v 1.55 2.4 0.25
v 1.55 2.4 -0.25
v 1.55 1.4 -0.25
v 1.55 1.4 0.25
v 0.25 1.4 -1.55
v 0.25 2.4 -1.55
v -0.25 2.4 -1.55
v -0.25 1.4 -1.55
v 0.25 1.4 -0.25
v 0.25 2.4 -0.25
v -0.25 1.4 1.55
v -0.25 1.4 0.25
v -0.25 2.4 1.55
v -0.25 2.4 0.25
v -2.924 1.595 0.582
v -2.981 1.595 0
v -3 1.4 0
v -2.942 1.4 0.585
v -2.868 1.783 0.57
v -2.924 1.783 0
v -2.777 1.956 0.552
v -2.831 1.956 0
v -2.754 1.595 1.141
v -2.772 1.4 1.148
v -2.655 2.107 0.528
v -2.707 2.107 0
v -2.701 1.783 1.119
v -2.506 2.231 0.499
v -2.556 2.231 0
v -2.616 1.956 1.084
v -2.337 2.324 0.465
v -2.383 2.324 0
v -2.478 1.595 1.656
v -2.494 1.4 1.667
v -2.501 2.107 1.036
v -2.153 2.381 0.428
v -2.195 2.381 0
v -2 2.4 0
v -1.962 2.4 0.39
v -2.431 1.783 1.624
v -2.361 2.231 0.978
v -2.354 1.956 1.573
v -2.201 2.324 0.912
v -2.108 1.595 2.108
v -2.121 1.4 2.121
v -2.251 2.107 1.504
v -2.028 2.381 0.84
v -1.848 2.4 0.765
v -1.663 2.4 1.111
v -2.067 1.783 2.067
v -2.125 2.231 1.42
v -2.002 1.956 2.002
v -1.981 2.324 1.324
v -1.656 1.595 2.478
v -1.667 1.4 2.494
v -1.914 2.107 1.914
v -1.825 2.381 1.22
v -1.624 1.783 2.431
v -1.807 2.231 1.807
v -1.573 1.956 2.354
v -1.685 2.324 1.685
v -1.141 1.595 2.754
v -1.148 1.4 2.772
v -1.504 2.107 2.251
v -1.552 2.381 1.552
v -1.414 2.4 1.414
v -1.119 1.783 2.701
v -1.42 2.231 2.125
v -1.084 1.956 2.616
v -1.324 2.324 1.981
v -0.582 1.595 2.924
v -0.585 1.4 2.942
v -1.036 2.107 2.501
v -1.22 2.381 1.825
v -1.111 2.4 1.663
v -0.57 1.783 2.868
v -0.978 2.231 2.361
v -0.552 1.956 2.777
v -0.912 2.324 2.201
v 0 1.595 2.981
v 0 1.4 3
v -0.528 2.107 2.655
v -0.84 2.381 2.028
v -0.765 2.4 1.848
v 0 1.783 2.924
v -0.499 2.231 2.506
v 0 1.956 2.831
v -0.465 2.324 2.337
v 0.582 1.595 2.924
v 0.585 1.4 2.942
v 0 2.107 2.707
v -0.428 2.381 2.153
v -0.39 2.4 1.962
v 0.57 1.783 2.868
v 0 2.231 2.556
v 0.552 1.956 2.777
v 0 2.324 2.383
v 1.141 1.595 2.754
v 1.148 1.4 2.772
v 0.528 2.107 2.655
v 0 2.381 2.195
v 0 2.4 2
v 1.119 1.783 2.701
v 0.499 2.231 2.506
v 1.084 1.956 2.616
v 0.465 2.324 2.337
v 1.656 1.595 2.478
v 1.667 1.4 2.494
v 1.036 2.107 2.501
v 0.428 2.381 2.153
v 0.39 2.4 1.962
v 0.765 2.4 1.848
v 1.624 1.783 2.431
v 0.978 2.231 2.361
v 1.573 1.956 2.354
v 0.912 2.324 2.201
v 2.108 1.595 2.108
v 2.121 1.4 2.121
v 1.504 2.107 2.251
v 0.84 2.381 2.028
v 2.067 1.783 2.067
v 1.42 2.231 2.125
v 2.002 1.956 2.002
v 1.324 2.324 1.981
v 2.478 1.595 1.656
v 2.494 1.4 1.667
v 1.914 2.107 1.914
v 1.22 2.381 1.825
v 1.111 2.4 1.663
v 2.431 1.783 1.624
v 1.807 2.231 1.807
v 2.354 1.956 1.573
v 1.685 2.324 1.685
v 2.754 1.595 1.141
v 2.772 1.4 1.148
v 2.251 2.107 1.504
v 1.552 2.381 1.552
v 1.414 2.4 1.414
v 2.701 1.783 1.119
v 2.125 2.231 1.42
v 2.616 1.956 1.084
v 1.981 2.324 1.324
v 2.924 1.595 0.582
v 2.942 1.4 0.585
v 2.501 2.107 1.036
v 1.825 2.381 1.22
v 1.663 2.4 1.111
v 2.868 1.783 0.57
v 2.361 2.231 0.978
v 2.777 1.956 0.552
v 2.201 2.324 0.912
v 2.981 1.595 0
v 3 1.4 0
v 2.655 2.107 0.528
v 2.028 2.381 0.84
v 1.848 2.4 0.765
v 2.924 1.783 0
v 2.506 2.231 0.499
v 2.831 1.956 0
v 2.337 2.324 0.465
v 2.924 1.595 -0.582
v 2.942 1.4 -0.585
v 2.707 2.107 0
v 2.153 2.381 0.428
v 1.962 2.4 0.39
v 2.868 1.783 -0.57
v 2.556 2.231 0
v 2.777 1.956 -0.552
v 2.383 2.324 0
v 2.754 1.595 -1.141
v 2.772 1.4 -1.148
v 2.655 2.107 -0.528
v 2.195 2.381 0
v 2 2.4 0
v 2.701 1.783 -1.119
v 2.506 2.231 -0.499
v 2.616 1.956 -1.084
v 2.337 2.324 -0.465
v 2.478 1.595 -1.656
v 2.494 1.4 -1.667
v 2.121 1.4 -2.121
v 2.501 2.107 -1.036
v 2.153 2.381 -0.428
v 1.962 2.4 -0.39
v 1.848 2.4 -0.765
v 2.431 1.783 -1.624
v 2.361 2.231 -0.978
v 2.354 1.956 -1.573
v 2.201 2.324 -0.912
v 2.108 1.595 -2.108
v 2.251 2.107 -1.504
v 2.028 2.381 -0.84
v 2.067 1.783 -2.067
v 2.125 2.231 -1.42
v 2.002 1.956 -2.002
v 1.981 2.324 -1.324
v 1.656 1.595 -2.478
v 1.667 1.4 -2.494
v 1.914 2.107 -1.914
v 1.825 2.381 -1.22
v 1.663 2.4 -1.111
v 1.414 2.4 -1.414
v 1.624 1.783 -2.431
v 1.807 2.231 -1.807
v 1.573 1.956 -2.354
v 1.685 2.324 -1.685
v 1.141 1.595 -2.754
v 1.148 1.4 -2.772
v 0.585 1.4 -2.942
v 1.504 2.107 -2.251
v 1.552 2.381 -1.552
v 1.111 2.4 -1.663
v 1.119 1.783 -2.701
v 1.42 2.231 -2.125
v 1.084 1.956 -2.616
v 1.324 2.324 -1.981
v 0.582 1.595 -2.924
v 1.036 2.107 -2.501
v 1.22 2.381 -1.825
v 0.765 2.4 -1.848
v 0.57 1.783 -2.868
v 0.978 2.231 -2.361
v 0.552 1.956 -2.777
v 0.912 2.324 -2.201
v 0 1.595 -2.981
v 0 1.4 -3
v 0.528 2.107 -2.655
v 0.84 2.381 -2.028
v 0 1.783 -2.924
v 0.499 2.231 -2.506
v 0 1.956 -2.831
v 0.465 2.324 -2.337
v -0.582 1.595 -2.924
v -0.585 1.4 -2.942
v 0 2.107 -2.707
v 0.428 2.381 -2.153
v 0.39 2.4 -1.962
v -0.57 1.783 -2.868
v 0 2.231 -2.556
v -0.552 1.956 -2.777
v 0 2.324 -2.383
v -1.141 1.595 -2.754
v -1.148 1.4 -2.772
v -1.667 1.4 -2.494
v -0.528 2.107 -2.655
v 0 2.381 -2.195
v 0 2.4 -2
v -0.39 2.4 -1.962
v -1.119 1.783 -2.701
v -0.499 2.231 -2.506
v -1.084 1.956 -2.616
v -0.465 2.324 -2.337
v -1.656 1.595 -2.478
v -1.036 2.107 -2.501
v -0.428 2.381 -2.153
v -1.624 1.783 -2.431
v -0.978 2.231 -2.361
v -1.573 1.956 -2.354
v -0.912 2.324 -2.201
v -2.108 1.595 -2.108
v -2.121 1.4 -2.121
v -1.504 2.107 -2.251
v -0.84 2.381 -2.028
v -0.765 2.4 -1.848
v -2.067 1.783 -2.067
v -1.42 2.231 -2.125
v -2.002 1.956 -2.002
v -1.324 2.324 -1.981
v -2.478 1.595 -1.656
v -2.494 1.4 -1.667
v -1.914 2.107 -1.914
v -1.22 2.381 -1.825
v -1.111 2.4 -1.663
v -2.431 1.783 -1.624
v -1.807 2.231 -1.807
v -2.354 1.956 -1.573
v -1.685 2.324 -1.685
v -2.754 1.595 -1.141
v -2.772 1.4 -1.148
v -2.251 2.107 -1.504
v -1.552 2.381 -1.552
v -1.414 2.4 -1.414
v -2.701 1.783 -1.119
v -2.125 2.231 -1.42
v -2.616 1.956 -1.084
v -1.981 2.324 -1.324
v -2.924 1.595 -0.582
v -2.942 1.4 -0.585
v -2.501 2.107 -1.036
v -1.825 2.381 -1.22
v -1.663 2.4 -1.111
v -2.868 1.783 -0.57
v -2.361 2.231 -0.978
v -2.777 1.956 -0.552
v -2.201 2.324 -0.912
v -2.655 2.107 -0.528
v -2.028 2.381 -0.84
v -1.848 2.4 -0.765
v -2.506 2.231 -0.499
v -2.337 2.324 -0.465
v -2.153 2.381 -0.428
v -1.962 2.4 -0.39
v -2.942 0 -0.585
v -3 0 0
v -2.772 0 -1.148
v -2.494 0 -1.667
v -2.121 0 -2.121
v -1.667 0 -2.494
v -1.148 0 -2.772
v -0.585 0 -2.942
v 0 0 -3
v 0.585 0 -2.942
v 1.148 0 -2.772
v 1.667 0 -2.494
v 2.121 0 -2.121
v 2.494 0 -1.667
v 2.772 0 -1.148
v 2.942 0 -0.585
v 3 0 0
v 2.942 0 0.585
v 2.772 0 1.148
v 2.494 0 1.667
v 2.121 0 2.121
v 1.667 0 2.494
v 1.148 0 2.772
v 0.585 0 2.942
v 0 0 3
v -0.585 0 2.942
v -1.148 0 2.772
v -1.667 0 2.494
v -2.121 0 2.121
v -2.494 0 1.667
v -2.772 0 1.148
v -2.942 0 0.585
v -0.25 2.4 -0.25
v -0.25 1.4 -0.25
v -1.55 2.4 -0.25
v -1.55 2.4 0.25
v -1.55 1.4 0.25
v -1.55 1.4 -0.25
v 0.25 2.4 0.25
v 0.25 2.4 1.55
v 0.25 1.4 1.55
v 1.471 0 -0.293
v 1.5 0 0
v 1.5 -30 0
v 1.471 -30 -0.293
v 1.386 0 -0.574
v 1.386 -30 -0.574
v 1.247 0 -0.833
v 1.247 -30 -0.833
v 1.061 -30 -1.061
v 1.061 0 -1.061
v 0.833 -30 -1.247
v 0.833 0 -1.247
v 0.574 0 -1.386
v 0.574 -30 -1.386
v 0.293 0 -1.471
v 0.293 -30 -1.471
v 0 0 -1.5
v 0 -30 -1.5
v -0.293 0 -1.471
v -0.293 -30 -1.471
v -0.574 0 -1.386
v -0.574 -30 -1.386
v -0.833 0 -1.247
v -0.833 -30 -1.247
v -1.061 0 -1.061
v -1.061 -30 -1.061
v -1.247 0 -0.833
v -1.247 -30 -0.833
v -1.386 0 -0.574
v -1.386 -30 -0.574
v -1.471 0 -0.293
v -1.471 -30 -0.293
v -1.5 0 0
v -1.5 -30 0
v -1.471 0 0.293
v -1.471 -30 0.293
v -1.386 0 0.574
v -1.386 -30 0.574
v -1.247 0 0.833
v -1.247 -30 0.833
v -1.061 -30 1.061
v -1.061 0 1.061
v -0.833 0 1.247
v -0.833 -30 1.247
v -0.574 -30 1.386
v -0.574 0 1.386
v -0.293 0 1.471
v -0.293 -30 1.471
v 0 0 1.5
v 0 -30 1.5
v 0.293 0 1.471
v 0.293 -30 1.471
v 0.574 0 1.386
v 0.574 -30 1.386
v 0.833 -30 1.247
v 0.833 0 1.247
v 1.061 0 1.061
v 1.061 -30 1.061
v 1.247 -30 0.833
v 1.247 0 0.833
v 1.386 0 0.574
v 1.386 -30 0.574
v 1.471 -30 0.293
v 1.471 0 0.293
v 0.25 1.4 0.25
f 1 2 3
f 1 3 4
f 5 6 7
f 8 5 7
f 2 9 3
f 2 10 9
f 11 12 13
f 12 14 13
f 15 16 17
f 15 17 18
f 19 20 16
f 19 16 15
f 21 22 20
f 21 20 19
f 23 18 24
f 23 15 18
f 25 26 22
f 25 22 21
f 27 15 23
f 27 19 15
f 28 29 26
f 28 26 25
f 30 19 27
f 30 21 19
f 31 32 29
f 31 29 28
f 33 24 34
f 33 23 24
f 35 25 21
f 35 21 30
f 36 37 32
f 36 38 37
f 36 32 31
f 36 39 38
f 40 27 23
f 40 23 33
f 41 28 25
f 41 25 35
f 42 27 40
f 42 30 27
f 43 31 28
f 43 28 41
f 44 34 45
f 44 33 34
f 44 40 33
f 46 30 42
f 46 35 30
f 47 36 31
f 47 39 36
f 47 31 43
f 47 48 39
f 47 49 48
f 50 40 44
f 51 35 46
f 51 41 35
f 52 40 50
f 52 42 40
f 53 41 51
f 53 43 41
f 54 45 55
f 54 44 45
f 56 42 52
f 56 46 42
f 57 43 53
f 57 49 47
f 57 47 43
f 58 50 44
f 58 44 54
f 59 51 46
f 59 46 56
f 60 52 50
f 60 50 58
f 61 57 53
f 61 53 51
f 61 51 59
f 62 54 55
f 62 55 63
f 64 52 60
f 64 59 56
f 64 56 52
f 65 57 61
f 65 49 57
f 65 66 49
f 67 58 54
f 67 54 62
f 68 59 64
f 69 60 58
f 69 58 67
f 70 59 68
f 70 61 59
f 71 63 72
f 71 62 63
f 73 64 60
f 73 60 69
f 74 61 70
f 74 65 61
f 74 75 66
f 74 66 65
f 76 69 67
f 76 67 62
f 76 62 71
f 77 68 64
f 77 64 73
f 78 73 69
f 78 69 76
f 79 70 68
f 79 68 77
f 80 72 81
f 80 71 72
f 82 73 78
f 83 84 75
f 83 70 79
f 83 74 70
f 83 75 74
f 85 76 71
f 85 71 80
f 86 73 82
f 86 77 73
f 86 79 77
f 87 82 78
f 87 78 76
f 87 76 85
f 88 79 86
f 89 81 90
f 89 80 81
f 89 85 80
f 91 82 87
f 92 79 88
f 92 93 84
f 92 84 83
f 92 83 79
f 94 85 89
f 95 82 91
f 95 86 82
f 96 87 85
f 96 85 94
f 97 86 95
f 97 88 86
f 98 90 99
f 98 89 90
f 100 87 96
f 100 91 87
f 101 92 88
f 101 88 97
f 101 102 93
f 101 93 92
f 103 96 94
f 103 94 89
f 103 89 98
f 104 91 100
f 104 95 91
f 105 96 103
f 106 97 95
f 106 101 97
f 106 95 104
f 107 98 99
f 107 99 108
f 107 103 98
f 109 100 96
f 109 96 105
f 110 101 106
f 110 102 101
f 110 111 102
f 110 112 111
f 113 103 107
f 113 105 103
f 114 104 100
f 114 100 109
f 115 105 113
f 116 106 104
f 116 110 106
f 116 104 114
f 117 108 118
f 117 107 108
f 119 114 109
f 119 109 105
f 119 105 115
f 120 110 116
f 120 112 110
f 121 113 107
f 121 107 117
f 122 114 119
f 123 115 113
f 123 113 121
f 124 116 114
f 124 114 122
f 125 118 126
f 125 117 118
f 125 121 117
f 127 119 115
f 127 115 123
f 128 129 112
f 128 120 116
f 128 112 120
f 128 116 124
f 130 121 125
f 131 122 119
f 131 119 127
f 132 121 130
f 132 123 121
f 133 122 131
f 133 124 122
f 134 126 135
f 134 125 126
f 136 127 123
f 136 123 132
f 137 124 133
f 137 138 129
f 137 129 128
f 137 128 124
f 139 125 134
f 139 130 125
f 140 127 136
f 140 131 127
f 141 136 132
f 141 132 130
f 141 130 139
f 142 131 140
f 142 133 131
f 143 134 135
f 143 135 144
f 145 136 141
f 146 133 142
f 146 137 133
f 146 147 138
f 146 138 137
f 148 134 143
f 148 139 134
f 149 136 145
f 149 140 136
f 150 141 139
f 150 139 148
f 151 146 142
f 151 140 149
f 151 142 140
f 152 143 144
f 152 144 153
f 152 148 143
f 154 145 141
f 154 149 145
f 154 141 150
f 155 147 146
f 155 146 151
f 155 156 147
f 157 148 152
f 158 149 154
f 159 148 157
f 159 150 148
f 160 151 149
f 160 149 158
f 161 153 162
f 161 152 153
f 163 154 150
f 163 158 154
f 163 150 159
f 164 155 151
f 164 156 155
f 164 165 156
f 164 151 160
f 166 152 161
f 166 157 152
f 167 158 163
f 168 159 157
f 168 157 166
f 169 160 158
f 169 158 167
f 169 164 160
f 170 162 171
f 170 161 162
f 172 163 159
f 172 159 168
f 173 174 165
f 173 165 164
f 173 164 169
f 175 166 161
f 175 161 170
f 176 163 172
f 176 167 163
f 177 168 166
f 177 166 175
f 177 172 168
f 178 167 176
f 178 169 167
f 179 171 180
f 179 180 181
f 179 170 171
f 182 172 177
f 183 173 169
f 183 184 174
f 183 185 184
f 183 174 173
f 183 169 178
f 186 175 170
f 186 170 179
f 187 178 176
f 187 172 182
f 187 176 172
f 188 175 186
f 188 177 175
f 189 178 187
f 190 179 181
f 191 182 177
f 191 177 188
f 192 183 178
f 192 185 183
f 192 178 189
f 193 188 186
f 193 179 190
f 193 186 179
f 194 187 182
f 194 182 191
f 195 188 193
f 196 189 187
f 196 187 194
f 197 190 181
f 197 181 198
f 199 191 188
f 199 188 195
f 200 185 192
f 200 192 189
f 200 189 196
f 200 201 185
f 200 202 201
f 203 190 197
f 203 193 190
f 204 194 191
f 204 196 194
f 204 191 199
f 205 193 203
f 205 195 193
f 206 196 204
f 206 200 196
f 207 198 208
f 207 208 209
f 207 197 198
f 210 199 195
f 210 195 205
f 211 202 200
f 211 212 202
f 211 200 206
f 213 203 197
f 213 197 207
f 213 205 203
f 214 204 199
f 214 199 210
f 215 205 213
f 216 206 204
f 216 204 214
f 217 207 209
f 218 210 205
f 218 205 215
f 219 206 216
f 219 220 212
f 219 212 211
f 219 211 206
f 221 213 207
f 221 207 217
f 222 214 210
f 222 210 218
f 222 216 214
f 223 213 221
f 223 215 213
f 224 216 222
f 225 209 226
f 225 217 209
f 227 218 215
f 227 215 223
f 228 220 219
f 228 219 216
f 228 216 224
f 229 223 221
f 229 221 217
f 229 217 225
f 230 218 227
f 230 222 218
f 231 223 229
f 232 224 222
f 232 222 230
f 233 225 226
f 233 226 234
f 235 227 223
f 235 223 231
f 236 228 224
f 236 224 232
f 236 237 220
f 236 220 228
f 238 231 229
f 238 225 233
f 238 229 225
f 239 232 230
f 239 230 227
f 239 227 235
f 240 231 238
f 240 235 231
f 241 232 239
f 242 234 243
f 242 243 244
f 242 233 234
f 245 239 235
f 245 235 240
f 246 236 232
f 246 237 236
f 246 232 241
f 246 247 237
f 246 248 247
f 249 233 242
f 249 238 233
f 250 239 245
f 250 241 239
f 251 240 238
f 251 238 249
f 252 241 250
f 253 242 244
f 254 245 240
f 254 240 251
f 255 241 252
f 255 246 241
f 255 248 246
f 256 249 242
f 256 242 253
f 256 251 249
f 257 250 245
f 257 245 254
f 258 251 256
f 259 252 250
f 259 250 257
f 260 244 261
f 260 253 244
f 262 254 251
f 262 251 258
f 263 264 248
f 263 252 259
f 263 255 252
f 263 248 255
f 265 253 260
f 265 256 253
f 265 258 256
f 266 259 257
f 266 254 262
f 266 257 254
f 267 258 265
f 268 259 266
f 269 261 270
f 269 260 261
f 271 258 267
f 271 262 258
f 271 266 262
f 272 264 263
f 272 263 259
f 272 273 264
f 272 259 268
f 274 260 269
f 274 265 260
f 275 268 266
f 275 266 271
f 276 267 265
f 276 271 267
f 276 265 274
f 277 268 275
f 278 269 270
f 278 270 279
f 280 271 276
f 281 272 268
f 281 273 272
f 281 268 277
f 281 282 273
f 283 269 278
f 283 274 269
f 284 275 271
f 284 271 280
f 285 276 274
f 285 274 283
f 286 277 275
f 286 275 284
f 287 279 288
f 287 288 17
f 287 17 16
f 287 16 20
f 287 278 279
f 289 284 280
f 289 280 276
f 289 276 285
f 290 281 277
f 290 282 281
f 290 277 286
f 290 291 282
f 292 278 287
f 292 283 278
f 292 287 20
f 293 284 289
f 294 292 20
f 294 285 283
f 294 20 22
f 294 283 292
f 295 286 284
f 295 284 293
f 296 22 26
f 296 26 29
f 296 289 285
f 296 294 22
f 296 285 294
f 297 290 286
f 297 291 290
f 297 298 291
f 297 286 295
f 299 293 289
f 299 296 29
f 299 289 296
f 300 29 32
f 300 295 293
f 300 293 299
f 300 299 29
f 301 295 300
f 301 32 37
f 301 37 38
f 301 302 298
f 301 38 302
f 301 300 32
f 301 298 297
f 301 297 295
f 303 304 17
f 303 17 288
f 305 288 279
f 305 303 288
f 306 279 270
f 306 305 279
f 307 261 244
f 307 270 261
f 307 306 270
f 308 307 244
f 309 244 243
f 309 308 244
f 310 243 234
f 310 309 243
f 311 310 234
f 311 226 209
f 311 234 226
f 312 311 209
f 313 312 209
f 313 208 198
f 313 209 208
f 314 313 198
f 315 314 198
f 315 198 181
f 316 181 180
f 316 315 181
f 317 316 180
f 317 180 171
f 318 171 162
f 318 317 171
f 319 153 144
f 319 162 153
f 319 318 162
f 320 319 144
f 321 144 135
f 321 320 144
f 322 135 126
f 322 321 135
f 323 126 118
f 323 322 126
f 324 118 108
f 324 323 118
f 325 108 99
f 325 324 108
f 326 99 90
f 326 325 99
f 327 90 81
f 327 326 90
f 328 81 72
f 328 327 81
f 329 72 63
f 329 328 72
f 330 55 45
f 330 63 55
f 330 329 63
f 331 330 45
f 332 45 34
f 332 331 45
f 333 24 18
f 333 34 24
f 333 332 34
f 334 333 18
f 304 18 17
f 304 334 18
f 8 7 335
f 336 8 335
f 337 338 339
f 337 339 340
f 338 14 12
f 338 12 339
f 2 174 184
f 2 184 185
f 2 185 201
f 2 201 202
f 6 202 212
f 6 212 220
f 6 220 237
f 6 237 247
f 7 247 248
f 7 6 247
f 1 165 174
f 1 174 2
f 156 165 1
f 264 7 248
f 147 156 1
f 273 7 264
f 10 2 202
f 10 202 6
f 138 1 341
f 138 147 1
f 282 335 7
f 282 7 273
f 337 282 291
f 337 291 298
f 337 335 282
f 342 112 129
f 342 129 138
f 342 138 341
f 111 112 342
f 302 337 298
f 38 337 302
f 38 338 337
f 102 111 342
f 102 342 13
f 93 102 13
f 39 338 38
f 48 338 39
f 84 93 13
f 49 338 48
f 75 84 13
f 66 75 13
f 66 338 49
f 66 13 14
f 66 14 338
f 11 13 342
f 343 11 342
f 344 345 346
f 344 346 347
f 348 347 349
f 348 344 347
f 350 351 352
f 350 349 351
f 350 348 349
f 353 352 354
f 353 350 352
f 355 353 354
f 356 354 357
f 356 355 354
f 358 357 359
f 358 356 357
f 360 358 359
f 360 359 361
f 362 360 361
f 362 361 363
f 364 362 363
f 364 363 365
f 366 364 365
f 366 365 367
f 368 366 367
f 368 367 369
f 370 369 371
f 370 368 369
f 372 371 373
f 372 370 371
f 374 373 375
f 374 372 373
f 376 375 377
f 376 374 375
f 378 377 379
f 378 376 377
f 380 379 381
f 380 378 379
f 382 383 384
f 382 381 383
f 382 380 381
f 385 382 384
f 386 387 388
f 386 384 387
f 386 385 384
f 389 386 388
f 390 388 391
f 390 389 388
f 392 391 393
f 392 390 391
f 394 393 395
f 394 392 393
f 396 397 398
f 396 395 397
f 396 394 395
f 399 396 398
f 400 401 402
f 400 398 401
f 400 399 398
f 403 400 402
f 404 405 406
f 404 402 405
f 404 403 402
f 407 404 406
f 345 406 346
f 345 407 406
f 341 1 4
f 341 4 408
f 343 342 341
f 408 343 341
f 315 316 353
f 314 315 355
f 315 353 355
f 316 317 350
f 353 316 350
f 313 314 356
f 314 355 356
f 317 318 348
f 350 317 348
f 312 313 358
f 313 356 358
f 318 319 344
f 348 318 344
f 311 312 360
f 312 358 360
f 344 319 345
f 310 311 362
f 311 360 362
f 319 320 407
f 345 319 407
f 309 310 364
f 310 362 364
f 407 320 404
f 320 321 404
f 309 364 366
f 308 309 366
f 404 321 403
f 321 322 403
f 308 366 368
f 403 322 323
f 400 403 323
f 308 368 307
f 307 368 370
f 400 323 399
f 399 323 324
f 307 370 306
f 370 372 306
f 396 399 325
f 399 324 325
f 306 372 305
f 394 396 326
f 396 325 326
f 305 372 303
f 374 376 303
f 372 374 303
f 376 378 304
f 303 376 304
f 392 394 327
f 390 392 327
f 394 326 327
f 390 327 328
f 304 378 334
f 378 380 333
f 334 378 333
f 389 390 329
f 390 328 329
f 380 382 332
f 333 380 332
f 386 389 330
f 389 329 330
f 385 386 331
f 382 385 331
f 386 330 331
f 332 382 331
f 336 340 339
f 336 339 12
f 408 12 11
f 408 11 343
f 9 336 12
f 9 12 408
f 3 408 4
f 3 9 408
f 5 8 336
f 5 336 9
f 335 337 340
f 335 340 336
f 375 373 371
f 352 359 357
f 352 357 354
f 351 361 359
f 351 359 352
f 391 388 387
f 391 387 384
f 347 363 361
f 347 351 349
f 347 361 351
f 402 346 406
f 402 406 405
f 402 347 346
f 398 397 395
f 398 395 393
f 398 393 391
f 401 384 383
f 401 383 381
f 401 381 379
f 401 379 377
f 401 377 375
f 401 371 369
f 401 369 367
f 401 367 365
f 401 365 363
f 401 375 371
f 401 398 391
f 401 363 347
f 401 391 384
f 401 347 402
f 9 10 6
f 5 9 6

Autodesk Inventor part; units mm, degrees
ref_plane "YZ Plane" through (0, 0, 0) normal (1, 0, 0) x (0, 1, 0)
ref_plane "XZ Plane" through (0, 0, 0) normal (0, 1, 0) x (-1, 0, 0)
ref_plane "XY Plane" through (0, 0, 0) normal (0, 0, 1) x (1, 0, 0)
sketch "Sketch1" plane through (0, 0, 0) normal (0, 1, 0) x (-1, 0, 0)
  circle A0 centre (0, 0) radius 3
  dimension "d0" = 6
extrude "Extrusion1" add sketch "Sketch1" along normal blind 2.4
sketch "Sketch2" plane through (0, 2.4, 0) normal (0, 1, 0) x (1, 0, 0)
  line L0 (-1.55, 0.25) -> (1.55, 0.25)
  line L1 (1.55, 0.25) -> (1.55, -0.25)
  line L2 (1.55, -0.25) -> (-1.55, -0.25)
  line L3 (-1.55, -0.25) -> (-1.55, 0.25)
  line L4 (-0.25, -1.55) -> (0.25, -1.55)
  line L5 (0.25, -1.55) -> (0.25, 1.55)
  line L6 (0.25, 1.55) -> (-0.25, 1.55)
  line L7 (-0.25, 1.55) -> (-0.25, -1.55)
  point P0 (0, 0)
  dimension "d5" = 3.1
  dimension "d6" = 0.5
  dimension "d9" = 0.5
  dimension "d10" = 3.1
extrude "Extrusion2" cut sketch "Sketch2" against normal blind 1
fillet "Fillet1" radius 1 1 edges at (3, 2.4, 0)
sketch "Sketch3" plane through (0, 0, 0) normal (0, -1, 0) x (1, 0, 0)
  circle A0 centre (0, 0) radius 1.5
  dimension "d14" = 3
extrude "Extrusion3" add sketch "Sketch3" along normal blind 30
thread "Thread1" size "M3x0.5" class "6g" standard "ANSI Metric M Profile" full length
properties part number "m3 30mm screw"
